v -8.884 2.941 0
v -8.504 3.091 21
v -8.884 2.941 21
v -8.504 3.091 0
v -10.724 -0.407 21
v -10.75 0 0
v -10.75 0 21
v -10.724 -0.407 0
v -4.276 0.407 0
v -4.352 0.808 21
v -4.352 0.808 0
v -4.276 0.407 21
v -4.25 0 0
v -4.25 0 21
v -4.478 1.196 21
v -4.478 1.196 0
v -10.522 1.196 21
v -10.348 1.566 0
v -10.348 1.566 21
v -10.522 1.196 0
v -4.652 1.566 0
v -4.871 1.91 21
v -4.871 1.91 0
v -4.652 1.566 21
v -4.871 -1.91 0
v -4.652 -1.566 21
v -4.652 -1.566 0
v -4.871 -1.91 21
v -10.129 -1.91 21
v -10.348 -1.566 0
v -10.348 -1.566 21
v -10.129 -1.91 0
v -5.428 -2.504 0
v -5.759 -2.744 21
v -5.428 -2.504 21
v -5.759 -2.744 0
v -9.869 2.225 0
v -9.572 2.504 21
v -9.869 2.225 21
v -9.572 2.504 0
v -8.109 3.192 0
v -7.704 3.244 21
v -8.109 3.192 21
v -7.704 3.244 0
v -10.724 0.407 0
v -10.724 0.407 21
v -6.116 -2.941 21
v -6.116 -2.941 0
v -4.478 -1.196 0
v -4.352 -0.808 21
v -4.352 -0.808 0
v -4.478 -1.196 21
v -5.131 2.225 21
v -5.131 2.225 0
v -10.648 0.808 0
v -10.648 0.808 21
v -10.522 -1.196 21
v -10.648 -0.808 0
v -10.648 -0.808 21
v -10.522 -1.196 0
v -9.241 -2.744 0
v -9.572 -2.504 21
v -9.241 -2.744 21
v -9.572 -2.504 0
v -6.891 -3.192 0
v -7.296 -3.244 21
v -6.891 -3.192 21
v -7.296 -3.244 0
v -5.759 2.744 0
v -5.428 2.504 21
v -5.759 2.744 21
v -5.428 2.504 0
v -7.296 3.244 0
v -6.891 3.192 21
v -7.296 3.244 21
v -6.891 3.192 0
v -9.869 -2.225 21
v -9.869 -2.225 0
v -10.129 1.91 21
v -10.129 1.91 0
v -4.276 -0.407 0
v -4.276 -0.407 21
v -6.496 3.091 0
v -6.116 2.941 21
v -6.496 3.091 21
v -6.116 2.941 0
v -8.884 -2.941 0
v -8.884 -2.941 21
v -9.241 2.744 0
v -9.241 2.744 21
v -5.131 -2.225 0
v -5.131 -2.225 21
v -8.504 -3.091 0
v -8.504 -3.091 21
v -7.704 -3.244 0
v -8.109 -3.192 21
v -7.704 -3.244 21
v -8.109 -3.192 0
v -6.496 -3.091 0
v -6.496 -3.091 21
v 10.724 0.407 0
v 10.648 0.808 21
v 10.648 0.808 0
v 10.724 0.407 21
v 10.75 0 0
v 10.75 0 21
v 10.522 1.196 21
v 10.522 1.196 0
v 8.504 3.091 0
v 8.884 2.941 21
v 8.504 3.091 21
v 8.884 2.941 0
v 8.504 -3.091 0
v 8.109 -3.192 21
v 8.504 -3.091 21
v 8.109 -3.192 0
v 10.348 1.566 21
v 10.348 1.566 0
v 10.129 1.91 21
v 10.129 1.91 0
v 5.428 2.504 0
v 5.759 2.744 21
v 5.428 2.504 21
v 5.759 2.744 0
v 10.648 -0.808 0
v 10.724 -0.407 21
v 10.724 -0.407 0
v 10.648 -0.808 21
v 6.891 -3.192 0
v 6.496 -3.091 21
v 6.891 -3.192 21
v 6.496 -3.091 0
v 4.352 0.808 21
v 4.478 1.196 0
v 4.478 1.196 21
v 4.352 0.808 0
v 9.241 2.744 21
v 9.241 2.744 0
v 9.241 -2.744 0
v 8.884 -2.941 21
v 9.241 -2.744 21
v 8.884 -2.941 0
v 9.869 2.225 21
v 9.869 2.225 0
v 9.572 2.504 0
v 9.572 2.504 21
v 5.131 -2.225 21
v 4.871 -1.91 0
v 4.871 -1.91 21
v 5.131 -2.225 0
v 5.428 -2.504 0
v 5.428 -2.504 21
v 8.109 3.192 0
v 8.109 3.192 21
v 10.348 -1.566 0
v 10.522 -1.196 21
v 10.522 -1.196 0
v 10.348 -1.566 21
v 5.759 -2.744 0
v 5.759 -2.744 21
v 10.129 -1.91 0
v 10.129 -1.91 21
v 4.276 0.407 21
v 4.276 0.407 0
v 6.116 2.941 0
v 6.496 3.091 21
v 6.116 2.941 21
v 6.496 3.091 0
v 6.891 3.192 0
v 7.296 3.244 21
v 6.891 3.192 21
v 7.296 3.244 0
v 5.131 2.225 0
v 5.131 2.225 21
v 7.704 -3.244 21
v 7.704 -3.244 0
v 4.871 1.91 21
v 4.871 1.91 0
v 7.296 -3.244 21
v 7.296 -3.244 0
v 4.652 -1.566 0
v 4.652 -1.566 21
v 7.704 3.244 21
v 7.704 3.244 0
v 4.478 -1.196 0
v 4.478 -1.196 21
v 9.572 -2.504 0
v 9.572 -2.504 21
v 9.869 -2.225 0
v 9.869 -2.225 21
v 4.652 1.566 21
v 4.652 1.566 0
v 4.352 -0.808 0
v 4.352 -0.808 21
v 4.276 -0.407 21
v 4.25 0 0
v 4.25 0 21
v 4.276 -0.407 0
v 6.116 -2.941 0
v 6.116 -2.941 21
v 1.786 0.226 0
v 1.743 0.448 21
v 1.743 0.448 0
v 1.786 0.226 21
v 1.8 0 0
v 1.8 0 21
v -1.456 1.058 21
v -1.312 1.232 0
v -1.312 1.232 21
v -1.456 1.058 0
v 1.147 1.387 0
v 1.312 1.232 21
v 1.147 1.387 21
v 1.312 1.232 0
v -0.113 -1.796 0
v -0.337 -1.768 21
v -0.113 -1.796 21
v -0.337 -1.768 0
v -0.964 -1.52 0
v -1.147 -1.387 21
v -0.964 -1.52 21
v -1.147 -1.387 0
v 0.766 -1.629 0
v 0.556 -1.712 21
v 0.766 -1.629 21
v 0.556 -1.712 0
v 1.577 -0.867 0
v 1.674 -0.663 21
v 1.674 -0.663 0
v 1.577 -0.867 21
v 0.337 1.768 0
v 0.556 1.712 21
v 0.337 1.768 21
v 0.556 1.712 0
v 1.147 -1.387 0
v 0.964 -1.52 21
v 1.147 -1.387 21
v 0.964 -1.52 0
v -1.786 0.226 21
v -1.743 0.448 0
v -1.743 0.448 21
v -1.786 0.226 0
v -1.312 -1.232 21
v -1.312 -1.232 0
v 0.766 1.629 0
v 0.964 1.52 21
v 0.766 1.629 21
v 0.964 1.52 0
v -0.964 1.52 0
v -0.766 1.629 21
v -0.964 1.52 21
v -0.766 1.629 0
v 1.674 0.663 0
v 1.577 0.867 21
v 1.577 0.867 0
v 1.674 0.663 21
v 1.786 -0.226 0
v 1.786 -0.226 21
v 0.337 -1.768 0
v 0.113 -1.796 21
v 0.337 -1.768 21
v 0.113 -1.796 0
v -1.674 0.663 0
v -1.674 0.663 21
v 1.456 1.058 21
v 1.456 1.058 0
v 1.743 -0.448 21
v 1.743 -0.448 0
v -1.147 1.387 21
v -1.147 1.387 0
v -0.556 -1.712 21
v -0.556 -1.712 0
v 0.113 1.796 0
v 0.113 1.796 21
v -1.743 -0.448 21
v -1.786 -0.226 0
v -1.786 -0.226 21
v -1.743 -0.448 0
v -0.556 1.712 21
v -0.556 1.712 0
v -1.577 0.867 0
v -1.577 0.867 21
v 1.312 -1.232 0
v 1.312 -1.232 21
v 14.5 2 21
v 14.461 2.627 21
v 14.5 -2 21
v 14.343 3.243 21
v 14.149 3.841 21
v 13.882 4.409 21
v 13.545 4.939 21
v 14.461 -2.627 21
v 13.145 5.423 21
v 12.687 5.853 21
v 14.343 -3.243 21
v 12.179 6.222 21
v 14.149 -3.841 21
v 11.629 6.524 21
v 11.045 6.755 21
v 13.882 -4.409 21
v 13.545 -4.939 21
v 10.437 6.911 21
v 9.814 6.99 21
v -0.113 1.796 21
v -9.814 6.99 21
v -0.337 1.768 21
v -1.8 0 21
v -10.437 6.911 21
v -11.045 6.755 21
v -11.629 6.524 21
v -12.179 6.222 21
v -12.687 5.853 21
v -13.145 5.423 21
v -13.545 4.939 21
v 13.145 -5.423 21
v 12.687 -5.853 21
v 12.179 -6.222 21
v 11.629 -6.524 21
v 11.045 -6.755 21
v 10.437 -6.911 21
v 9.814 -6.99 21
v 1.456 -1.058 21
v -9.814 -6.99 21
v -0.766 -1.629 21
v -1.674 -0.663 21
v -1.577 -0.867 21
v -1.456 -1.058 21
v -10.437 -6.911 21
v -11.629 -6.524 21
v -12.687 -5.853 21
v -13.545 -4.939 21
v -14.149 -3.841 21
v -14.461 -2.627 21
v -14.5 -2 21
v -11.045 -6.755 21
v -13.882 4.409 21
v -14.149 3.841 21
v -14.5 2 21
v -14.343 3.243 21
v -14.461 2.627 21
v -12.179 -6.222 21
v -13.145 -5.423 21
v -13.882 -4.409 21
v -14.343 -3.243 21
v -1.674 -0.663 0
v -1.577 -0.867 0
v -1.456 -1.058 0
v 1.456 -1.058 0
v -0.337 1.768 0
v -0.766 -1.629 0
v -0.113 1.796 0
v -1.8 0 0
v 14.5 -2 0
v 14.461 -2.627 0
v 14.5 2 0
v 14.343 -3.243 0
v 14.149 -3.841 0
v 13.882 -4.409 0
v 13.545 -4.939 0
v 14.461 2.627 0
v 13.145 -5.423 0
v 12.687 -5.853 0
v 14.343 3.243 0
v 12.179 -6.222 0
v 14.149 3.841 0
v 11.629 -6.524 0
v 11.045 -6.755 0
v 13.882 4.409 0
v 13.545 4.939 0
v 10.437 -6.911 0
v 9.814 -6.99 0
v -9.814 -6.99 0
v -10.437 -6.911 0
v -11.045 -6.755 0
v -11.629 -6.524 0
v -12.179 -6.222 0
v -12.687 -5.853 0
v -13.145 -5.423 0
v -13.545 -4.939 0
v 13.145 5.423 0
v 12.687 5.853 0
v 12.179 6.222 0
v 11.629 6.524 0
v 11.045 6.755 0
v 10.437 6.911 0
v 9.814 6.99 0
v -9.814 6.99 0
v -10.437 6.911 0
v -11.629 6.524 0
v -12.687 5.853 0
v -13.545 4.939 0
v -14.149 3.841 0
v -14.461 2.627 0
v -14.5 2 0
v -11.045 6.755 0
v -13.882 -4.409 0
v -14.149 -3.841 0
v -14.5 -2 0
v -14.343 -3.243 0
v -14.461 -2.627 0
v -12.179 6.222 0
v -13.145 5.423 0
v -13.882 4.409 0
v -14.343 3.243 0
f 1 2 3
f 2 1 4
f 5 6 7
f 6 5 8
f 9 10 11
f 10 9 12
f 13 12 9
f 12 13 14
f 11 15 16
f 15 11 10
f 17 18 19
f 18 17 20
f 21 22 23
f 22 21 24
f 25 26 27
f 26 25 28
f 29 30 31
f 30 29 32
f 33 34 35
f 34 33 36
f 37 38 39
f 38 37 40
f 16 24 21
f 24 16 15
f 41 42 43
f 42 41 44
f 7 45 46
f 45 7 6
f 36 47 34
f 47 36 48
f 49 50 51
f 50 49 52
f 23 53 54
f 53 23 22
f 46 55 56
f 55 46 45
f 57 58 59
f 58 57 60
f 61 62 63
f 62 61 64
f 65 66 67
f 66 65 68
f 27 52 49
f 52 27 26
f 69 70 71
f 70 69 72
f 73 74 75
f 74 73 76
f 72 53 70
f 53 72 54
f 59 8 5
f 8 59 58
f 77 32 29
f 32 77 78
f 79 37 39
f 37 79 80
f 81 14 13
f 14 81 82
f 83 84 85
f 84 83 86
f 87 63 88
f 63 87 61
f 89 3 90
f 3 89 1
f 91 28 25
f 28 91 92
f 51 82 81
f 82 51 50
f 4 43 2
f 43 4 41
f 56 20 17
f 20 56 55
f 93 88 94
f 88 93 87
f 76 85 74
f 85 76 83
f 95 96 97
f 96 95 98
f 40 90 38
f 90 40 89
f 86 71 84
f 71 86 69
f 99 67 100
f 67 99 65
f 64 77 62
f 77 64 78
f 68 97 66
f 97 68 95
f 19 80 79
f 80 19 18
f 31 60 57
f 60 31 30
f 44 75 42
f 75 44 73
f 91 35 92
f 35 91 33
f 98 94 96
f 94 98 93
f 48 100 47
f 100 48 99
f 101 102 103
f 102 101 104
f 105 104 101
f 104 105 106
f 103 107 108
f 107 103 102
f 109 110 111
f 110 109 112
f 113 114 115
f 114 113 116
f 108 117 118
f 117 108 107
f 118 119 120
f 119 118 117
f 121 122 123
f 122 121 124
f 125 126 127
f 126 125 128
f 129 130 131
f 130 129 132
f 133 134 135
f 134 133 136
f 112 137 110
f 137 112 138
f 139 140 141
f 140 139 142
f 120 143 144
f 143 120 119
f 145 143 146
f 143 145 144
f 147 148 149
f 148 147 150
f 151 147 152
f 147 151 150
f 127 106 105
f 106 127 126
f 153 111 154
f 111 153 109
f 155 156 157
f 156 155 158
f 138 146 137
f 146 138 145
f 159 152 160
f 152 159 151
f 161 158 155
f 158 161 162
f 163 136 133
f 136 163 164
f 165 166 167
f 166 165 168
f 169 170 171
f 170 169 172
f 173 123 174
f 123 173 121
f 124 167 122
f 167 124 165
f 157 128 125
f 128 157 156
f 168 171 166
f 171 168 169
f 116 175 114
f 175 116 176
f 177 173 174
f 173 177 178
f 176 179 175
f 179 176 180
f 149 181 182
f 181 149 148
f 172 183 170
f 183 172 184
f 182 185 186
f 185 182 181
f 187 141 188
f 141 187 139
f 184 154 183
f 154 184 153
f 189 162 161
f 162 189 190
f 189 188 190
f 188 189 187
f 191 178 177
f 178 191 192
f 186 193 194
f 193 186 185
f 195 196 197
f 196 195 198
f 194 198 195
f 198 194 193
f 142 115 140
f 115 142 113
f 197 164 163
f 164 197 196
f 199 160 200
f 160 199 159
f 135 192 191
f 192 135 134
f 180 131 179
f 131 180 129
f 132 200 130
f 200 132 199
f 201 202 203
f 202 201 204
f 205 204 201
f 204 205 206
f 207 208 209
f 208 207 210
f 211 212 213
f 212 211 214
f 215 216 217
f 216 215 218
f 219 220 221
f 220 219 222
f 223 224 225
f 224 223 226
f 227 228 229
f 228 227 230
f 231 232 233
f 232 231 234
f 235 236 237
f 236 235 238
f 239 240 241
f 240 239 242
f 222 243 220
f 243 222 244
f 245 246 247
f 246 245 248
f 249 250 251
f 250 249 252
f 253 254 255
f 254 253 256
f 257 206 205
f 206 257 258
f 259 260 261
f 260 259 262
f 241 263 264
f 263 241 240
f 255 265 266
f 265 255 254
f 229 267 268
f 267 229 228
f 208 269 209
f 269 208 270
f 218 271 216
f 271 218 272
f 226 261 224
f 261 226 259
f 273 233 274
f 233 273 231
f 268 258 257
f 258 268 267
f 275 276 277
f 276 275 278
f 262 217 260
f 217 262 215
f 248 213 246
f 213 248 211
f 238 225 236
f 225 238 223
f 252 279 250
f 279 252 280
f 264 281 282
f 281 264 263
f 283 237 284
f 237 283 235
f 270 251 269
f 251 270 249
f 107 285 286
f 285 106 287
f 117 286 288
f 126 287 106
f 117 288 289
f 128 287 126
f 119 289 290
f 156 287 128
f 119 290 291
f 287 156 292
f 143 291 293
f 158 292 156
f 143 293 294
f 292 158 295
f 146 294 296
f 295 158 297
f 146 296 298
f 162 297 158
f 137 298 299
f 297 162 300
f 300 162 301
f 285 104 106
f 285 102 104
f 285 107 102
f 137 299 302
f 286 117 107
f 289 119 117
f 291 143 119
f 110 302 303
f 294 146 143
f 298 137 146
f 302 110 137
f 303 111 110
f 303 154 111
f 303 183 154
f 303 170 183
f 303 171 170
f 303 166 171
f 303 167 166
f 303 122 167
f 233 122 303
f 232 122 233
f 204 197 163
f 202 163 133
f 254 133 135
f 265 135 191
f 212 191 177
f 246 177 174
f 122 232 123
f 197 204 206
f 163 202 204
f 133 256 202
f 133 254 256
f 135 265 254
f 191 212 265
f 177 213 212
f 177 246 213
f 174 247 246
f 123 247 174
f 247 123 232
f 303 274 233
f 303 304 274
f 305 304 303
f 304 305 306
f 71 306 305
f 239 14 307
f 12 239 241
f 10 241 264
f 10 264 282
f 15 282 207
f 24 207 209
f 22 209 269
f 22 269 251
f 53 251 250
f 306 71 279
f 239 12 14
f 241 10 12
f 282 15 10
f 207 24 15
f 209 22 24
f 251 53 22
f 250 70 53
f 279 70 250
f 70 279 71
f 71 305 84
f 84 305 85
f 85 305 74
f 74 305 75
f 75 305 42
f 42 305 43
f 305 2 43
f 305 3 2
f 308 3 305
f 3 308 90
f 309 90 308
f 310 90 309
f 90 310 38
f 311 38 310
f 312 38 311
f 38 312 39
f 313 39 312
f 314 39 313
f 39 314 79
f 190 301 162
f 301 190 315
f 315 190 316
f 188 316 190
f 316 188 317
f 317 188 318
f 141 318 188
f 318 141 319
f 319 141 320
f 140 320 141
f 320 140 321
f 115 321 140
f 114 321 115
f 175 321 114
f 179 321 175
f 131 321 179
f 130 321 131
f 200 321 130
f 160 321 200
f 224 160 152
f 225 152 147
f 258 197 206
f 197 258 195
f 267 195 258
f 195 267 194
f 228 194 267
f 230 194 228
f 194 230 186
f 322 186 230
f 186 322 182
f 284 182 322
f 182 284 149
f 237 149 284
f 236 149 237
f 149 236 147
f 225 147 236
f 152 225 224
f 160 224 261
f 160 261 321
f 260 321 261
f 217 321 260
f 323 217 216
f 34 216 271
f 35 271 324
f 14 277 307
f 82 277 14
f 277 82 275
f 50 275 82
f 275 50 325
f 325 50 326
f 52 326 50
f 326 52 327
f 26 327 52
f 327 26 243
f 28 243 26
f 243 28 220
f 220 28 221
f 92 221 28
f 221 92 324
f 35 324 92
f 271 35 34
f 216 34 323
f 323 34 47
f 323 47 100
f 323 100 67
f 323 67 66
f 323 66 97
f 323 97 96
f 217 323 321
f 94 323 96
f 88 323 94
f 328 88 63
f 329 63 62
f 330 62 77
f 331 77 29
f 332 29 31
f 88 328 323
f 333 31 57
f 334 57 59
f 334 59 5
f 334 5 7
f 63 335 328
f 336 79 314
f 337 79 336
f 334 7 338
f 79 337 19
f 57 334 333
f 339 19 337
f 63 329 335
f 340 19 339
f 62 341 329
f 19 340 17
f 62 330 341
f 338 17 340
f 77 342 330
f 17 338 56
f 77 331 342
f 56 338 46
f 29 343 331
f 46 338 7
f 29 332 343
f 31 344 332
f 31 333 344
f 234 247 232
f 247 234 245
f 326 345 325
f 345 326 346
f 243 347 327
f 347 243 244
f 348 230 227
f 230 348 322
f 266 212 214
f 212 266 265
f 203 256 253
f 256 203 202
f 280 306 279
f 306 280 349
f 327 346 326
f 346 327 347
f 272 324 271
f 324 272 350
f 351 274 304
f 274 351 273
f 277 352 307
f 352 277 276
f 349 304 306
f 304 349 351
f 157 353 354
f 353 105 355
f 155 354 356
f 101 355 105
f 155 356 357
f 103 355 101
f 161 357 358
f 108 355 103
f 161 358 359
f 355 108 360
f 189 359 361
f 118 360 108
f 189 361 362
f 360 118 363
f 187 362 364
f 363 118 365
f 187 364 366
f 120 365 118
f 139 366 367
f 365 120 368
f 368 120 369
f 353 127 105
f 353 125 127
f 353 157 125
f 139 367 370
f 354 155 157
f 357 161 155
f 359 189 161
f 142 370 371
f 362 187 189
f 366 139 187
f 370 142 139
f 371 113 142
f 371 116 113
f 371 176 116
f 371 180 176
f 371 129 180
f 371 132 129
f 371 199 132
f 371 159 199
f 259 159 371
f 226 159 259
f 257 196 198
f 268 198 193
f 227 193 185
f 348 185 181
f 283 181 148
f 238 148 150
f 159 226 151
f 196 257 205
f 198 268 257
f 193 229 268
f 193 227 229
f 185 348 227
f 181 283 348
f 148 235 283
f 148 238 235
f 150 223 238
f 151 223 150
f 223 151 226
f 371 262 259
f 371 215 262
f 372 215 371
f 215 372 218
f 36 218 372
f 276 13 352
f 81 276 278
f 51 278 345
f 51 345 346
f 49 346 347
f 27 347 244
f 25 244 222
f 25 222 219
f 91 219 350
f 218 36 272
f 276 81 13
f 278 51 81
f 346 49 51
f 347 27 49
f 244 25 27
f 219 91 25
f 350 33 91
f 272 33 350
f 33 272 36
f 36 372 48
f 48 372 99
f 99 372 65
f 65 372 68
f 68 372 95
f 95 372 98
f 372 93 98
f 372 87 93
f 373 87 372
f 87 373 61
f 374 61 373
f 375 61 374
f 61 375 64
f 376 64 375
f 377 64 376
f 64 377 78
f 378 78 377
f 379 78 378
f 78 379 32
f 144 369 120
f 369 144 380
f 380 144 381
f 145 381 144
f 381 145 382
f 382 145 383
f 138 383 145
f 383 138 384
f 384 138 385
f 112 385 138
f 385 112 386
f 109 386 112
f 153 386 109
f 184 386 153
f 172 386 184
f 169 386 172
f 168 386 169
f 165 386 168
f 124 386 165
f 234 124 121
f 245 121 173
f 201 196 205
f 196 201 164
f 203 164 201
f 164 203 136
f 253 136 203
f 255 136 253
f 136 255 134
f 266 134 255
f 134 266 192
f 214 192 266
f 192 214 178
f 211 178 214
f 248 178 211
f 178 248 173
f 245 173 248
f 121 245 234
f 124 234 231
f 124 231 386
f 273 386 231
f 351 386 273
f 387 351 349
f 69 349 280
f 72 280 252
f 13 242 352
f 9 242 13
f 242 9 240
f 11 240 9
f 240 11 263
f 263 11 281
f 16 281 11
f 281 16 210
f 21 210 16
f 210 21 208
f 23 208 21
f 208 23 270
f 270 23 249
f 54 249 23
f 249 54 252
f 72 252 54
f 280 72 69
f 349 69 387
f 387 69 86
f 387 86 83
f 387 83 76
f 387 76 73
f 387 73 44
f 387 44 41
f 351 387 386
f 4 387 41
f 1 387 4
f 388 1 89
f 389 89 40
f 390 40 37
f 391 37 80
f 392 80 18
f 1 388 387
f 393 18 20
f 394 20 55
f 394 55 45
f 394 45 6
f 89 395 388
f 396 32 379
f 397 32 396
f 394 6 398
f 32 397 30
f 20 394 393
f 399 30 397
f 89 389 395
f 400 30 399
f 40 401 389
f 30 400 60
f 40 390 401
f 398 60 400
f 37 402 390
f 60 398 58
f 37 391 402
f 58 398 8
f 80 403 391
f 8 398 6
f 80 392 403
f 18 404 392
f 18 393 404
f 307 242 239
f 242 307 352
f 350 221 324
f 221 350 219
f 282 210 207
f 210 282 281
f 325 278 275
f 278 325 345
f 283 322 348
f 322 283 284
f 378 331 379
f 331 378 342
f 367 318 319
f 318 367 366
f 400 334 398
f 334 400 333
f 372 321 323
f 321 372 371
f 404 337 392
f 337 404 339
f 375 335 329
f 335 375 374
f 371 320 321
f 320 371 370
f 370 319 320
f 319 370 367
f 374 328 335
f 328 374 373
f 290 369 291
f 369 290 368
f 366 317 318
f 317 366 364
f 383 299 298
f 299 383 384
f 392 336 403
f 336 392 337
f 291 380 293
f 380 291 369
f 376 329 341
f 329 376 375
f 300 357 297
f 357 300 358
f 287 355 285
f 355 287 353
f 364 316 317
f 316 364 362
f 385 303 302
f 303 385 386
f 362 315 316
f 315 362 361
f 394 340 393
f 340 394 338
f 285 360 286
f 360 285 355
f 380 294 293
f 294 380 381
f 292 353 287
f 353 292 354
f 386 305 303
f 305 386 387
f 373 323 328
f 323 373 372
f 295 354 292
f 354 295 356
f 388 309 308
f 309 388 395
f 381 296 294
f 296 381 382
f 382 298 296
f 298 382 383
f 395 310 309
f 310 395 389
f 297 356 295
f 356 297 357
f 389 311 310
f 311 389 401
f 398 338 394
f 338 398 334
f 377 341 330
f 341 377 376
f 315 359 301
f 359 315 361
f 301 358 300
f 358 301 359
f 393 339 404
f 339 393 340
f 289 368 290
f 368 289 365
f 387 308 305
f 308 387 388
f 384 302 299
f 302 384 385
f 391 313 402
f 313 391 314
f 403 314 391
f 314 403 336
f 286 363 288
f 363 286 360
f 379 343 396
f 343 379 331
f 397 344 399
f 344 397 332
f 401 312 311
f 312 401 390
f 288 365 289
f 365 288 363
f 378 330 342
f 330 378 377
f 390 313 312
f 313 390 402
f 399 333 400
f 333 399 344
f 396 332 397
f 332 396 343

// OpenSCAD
$fn = 50;


difference() {
	union() {
		hull() {
			translate(v = [-9.5000000000, 2.0000000000, 0]) {
				cylinder(h = 21, r = 5);
			}
			translate(v = [9.5000000000, 2.0000000000, 0]) {
				cylinder(h = 21, r = 5);
			}
			translate(v = [-9.5000000000, -2.0000000000, 0]) {
				cylinder(h = 21, r = 5);
			}
			translate(v = [9.5000000000, -2.0000000000, 0]) {
				cylinder(h = 21, r = 5);
			}
		}
	}
	union() {
		translate(v = [-7.5000000000, 0.0000000000, -100.0000000000]) {
			cylinder(h = 200, r = 3.2500000000);
		}
		translate(v = [7.5000000000, 0.0000000000, -100.0000000000]) {
			cylinder(h = 200, r = 3.2500000000);
		}
		translate(v = [-7.5000000000, 0.0000000000, 0]) {
			cylinder(h = 21, r = 1.8000000000);
		}
		cylinder(h = 21, r = 1.8000000000);
		translate(v = [7.5000000000, 0.0000000000, 0]) {
			cylinder(h = 21, r = 1.8000000000);
		}
		translate(v = [-7.5000000000, 0.0000000000, 0]) {
			cylinder(h = 21, r = 1.8000000000);
		}
		cylinder(h = 21, r = 1.8000000000);
		translate(v = [7.5000000000, 0.0000000000, 0]) {
			cylinder(h = 21, r = 1.8000000000);
		}
		translate(v = [-7.5000000000, 0.0000000000, 0]) {
			cylinder(h = 21, r = 1.8000000000);
		}
		cylinder(h = 21, r = 1.8000000000);
		translate(v = [7.5000000000, 0.0000000000, 0]) {
			cylinder(h = 21, r = 1.8000000000);
		}
	}
}
